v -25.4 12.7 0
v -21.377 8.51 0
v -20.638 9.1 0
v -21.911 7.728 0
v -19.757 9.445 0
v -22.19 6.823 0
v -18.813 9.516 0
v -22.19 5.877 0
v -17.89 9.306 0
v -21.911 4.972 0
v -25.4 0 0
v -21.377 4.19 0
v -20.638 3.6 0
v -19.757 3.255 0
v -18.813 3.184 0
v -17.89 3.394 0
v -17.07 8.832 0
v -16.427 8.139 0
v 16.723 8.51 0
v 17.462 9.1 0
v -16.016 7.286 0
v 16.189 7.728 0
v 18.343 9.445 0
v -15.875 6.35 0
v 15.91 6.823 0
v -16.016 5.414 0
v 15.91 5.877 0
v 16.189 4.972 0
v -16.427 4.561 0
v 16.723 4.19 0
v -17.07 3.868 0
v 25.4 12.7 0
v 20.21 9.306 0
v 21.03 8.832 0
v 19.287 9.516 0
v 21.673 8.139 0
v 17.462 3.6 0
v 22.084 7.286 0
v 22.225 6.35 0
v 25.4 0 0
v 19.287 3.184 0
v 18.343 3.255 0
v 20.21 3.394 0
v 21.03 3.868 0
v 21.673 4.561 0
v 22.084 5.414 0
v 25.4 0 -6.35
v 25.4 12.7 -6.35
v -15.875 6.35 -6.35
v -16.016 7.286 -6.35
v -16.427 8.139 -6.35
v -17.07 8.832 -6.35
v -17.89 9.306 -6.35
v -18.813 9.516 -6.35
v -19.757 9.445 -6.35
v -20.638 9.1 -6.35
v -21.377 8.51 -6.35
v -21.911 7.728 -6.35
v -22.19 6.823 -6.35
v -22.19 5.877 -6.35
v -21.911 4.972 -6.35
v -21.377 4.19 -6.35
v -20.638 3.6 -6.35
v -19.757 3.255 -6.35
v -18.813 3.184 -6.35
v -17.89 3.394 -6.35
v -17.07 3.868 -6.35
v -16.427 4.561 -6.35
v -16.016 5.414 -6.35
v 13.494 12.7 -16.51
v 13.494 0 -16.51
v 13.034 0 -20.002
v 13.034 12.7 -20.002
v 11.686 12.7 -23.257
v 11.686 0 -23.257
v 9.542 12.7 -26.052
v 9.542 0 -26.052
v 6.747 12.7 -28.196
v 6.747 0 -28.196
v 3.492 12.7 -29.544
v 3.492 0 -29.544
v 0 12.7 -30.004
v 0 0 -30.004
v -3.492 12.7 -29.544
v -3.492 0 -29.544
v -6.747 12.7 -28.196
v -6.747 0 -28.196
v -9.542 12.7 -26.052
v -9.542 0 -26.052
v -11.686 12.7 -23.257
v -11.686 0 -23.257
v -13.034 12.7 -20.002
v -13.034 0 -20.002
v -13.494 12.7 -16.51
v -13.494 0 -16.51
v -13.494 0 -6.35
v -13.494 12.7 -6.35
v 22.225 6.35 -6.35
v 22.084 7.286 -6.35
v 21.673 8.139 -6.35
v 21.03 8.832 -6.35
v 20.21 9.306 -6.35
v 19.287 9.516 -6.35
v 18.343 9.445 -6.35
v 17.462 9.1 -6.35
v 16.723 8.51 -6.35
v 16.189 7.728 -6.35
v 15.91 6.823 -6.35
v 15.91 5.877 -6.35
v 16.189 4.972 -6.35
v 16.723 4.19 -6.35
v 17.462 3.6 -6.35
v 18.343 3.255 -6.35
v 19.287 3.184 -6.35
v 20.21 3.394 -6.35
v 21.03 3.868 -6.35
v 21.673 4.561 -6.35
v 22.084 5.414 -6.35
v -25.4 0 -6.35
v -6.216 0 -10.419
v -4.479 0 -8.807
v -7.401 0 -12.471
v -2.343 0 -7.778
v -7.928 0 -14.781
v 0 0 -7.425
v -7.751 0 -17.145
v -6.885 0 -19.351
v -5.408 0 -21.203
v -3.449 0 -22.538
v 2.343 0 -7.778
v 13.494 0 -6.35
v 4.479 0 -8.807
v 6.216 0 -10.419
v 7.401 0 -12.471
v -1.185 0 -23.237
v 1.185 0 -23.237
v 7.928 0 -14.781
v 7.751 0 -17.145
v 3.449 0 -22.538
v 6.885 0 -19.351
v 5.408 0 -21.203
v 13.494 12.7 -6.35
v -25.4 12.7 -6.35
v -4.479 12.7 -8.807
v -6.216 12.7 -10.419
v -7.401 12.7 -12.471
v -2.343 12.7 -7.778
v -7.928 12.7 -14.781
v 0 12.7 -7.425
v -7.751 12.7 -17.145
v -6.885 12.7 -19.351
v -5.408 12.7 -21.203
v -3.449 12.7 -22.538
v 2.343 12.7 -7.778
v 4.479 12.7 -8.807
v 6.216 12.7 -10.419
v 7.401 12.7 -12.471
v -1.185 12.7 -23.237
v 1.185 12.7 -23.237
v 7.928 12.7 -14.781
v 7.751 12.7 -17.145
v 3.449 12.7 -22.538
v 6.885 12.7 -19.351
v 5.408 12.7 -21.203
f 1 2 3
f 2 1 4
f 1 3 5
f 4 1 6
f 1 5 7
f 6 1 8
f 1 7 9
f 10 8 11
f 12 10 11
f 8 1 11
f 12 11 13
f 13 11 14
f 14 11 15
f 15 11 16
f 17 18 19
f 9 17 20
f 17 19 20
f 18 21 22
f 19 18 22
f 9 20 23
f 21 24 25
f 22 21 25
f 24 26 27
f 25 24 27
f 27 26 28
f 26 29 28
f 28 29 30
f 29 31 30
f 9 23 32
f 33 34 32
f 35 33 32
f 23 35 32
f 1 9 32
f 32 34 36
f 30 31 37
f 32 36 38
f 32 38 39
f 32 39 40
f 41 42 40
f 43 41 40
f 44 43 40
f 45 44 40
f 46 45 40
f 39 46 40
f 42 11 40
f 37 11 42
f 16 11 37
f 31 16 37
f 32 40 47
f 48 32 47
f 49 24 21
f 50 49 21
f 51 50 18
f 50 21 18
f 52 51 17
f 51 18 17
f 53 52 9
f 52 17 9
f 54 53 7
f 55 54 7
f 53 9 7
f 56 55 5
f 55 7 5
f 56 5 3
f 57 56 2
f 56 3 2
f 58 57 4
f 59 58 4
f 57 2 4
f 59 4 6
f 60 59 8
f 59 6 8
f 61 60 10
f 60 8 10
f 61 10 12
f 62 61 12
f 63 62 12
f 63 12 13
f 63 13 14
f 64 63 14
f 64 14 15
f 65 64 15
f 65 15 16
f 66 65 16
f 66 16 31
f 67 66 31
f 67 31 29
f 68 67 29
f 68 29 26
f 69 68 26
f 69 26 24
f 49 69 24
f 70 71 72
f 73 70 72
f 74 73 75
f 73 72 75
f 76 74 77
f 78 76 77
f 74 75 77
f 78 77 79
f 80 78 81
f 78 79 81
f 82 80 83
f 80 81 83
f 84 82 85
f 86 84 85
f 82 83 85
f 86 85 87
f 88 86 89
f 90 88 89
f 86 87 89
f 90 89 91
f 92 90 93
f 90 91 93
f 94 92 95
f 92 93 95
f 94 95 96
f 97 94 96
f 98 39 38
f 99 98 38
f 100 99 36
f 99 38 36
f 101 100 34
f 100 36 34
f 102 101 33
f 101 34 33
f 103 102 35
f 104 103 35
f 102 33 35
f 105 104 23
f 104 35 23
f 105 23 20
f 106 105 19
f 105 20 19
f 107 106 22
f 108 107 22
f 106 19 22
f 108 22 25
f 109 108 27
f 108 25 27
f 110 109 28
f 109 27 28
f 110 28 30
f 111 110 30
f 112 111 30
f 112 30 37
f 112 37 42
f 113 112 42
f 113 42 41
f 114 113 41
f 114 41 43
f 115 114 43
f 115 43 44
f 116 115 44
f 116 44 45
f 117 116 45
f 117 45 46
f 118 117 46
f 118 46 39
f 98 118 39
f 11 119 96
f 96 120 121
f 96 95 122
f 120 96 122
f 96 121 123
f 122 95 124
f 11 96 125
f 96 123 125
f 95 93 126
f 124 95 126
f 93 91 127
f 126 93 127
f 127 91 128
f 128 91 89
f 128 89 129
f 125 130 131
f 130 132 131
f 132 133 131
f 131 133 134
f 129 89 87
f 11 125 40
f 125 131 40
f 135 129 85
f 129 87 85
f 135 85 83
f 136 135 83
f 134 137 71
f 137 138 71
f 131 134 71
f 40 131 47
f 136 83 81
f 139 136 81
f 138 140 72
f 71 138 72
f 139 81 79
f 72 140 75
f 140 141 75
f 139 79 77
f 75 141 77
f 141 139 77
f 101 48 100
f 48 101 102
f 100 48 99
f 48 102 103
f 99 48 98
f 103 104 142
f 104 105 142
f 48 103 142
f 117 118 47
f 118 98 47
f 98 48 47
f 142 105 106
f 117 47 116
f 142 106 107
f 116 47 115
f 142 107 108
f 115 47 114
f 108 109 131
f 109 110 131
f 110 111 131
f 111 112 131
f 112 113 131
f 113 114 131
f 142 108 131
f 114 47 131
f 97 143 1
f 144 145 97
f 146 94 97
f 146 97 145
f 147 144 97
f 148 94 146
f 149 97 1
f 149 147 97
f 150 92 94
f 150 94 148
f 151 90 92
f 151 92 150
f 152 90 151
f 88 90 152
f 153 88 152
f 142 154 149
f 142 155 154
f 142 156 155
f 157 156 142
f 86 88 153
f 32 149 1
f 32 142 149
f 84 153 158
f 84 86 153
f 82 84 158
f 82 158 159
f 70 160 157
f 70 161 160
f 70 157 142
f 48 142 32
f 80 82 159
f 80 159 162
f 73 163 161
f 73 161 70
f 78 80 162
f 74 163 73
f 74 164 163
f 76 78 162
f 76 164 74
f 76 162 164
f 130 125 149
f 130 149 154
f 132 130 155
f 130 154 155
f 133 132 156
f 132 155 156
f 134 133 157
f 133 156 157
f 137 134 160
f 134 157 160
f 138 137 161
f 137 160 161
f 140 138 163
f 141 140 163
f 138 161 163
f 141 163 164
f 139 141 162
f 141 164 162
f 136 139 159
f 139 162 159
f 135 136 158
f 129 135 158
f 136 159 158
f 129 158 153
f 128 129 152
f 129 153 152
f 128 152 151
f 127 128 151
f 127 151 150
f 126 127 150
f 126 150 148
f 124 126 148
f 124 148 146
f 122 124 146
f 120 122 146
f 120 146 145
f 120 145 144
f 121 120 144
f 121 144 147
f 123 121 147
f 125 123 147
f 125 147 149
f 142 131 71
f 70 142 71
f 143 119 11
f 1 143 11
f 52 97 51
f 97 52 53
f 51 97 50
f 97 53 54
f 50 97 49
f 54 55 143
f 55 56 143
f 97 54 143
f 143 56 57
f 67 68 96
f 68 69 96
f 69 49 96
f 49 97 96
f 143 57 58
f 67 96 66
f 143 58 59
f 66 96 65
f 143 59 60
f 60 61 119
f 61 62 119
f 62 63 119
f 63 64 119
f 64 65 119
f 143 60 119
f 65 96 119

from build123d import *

# Parameters (mm, degrees)
BOSS_EXTRUDE1_DEPTH = 12.7
SKETCH2_R           = 7.9502
CUT_EXTRUDE1_DEPTH  = 42.311923389
SKETCH3_R           = 3.175
CUT_EXTRUDE2_DEPTH  = 42.311923389


with BuildPart() as part:
    # Sketch1 → Boss-Extrude1 (new body)
    with BuildSketch(Plane(origin=(0, 0, 0), x_dir=(1, 0, 0), z_dir=(0, 1, 0))):
        with BuildLine():
            Line((-25.4, 0), (25.4, 0))
            Line((25.4, 0), (25.4, 6.35))
            Line((25.4, 6.35), (13.49375, 6.35))
            Line((13.49375, 6.35), (13.49375, 16.51))
            ThreePointArc((13.49375, 16.51), (0, 30.00375), (-13.49375, 16.51))
            Line((-13.49375, 16.51), (-13.49375, 6.35))
            Line((-13.49375, 6.35), (-25.4, 6.35))
            Line((-25.4, 6.35), (-25.4, 0))
        make_face()
    extrude(amount=BOSS_EXTRUDE1_DEPTH)

    # Sketch2 → Cut-Extrude1 (cut, through all)
    with BuildSketch(Plane(origin=(0, 12.7, 0), x_dir=(1, 0, 0), z_dir=(0, 1, 0))):
        with Locations(Location((0, 15.375414513, 0), (0, 0, 270))):
            Circle(SKETCH2_R)
    extrude(amount=-CUT_EXTRUDE1_DEPTH, mode=Mode.SUBTRACT)

    # Sketch3 → Cut-Extrude2 (cut, through all)
    with BuildSketch(Plane.XY):
        with Locations((-19.05, 6.35)):
            Circle(SKETCH3_R)
        with Locations((19.05, 6.35)):
            Circle(SKETCH3_R)
    extrude(amount=-CUT_EXTRUDE2_DEPTH, mode=Mode.SUBTRACT)


solid = part.part
